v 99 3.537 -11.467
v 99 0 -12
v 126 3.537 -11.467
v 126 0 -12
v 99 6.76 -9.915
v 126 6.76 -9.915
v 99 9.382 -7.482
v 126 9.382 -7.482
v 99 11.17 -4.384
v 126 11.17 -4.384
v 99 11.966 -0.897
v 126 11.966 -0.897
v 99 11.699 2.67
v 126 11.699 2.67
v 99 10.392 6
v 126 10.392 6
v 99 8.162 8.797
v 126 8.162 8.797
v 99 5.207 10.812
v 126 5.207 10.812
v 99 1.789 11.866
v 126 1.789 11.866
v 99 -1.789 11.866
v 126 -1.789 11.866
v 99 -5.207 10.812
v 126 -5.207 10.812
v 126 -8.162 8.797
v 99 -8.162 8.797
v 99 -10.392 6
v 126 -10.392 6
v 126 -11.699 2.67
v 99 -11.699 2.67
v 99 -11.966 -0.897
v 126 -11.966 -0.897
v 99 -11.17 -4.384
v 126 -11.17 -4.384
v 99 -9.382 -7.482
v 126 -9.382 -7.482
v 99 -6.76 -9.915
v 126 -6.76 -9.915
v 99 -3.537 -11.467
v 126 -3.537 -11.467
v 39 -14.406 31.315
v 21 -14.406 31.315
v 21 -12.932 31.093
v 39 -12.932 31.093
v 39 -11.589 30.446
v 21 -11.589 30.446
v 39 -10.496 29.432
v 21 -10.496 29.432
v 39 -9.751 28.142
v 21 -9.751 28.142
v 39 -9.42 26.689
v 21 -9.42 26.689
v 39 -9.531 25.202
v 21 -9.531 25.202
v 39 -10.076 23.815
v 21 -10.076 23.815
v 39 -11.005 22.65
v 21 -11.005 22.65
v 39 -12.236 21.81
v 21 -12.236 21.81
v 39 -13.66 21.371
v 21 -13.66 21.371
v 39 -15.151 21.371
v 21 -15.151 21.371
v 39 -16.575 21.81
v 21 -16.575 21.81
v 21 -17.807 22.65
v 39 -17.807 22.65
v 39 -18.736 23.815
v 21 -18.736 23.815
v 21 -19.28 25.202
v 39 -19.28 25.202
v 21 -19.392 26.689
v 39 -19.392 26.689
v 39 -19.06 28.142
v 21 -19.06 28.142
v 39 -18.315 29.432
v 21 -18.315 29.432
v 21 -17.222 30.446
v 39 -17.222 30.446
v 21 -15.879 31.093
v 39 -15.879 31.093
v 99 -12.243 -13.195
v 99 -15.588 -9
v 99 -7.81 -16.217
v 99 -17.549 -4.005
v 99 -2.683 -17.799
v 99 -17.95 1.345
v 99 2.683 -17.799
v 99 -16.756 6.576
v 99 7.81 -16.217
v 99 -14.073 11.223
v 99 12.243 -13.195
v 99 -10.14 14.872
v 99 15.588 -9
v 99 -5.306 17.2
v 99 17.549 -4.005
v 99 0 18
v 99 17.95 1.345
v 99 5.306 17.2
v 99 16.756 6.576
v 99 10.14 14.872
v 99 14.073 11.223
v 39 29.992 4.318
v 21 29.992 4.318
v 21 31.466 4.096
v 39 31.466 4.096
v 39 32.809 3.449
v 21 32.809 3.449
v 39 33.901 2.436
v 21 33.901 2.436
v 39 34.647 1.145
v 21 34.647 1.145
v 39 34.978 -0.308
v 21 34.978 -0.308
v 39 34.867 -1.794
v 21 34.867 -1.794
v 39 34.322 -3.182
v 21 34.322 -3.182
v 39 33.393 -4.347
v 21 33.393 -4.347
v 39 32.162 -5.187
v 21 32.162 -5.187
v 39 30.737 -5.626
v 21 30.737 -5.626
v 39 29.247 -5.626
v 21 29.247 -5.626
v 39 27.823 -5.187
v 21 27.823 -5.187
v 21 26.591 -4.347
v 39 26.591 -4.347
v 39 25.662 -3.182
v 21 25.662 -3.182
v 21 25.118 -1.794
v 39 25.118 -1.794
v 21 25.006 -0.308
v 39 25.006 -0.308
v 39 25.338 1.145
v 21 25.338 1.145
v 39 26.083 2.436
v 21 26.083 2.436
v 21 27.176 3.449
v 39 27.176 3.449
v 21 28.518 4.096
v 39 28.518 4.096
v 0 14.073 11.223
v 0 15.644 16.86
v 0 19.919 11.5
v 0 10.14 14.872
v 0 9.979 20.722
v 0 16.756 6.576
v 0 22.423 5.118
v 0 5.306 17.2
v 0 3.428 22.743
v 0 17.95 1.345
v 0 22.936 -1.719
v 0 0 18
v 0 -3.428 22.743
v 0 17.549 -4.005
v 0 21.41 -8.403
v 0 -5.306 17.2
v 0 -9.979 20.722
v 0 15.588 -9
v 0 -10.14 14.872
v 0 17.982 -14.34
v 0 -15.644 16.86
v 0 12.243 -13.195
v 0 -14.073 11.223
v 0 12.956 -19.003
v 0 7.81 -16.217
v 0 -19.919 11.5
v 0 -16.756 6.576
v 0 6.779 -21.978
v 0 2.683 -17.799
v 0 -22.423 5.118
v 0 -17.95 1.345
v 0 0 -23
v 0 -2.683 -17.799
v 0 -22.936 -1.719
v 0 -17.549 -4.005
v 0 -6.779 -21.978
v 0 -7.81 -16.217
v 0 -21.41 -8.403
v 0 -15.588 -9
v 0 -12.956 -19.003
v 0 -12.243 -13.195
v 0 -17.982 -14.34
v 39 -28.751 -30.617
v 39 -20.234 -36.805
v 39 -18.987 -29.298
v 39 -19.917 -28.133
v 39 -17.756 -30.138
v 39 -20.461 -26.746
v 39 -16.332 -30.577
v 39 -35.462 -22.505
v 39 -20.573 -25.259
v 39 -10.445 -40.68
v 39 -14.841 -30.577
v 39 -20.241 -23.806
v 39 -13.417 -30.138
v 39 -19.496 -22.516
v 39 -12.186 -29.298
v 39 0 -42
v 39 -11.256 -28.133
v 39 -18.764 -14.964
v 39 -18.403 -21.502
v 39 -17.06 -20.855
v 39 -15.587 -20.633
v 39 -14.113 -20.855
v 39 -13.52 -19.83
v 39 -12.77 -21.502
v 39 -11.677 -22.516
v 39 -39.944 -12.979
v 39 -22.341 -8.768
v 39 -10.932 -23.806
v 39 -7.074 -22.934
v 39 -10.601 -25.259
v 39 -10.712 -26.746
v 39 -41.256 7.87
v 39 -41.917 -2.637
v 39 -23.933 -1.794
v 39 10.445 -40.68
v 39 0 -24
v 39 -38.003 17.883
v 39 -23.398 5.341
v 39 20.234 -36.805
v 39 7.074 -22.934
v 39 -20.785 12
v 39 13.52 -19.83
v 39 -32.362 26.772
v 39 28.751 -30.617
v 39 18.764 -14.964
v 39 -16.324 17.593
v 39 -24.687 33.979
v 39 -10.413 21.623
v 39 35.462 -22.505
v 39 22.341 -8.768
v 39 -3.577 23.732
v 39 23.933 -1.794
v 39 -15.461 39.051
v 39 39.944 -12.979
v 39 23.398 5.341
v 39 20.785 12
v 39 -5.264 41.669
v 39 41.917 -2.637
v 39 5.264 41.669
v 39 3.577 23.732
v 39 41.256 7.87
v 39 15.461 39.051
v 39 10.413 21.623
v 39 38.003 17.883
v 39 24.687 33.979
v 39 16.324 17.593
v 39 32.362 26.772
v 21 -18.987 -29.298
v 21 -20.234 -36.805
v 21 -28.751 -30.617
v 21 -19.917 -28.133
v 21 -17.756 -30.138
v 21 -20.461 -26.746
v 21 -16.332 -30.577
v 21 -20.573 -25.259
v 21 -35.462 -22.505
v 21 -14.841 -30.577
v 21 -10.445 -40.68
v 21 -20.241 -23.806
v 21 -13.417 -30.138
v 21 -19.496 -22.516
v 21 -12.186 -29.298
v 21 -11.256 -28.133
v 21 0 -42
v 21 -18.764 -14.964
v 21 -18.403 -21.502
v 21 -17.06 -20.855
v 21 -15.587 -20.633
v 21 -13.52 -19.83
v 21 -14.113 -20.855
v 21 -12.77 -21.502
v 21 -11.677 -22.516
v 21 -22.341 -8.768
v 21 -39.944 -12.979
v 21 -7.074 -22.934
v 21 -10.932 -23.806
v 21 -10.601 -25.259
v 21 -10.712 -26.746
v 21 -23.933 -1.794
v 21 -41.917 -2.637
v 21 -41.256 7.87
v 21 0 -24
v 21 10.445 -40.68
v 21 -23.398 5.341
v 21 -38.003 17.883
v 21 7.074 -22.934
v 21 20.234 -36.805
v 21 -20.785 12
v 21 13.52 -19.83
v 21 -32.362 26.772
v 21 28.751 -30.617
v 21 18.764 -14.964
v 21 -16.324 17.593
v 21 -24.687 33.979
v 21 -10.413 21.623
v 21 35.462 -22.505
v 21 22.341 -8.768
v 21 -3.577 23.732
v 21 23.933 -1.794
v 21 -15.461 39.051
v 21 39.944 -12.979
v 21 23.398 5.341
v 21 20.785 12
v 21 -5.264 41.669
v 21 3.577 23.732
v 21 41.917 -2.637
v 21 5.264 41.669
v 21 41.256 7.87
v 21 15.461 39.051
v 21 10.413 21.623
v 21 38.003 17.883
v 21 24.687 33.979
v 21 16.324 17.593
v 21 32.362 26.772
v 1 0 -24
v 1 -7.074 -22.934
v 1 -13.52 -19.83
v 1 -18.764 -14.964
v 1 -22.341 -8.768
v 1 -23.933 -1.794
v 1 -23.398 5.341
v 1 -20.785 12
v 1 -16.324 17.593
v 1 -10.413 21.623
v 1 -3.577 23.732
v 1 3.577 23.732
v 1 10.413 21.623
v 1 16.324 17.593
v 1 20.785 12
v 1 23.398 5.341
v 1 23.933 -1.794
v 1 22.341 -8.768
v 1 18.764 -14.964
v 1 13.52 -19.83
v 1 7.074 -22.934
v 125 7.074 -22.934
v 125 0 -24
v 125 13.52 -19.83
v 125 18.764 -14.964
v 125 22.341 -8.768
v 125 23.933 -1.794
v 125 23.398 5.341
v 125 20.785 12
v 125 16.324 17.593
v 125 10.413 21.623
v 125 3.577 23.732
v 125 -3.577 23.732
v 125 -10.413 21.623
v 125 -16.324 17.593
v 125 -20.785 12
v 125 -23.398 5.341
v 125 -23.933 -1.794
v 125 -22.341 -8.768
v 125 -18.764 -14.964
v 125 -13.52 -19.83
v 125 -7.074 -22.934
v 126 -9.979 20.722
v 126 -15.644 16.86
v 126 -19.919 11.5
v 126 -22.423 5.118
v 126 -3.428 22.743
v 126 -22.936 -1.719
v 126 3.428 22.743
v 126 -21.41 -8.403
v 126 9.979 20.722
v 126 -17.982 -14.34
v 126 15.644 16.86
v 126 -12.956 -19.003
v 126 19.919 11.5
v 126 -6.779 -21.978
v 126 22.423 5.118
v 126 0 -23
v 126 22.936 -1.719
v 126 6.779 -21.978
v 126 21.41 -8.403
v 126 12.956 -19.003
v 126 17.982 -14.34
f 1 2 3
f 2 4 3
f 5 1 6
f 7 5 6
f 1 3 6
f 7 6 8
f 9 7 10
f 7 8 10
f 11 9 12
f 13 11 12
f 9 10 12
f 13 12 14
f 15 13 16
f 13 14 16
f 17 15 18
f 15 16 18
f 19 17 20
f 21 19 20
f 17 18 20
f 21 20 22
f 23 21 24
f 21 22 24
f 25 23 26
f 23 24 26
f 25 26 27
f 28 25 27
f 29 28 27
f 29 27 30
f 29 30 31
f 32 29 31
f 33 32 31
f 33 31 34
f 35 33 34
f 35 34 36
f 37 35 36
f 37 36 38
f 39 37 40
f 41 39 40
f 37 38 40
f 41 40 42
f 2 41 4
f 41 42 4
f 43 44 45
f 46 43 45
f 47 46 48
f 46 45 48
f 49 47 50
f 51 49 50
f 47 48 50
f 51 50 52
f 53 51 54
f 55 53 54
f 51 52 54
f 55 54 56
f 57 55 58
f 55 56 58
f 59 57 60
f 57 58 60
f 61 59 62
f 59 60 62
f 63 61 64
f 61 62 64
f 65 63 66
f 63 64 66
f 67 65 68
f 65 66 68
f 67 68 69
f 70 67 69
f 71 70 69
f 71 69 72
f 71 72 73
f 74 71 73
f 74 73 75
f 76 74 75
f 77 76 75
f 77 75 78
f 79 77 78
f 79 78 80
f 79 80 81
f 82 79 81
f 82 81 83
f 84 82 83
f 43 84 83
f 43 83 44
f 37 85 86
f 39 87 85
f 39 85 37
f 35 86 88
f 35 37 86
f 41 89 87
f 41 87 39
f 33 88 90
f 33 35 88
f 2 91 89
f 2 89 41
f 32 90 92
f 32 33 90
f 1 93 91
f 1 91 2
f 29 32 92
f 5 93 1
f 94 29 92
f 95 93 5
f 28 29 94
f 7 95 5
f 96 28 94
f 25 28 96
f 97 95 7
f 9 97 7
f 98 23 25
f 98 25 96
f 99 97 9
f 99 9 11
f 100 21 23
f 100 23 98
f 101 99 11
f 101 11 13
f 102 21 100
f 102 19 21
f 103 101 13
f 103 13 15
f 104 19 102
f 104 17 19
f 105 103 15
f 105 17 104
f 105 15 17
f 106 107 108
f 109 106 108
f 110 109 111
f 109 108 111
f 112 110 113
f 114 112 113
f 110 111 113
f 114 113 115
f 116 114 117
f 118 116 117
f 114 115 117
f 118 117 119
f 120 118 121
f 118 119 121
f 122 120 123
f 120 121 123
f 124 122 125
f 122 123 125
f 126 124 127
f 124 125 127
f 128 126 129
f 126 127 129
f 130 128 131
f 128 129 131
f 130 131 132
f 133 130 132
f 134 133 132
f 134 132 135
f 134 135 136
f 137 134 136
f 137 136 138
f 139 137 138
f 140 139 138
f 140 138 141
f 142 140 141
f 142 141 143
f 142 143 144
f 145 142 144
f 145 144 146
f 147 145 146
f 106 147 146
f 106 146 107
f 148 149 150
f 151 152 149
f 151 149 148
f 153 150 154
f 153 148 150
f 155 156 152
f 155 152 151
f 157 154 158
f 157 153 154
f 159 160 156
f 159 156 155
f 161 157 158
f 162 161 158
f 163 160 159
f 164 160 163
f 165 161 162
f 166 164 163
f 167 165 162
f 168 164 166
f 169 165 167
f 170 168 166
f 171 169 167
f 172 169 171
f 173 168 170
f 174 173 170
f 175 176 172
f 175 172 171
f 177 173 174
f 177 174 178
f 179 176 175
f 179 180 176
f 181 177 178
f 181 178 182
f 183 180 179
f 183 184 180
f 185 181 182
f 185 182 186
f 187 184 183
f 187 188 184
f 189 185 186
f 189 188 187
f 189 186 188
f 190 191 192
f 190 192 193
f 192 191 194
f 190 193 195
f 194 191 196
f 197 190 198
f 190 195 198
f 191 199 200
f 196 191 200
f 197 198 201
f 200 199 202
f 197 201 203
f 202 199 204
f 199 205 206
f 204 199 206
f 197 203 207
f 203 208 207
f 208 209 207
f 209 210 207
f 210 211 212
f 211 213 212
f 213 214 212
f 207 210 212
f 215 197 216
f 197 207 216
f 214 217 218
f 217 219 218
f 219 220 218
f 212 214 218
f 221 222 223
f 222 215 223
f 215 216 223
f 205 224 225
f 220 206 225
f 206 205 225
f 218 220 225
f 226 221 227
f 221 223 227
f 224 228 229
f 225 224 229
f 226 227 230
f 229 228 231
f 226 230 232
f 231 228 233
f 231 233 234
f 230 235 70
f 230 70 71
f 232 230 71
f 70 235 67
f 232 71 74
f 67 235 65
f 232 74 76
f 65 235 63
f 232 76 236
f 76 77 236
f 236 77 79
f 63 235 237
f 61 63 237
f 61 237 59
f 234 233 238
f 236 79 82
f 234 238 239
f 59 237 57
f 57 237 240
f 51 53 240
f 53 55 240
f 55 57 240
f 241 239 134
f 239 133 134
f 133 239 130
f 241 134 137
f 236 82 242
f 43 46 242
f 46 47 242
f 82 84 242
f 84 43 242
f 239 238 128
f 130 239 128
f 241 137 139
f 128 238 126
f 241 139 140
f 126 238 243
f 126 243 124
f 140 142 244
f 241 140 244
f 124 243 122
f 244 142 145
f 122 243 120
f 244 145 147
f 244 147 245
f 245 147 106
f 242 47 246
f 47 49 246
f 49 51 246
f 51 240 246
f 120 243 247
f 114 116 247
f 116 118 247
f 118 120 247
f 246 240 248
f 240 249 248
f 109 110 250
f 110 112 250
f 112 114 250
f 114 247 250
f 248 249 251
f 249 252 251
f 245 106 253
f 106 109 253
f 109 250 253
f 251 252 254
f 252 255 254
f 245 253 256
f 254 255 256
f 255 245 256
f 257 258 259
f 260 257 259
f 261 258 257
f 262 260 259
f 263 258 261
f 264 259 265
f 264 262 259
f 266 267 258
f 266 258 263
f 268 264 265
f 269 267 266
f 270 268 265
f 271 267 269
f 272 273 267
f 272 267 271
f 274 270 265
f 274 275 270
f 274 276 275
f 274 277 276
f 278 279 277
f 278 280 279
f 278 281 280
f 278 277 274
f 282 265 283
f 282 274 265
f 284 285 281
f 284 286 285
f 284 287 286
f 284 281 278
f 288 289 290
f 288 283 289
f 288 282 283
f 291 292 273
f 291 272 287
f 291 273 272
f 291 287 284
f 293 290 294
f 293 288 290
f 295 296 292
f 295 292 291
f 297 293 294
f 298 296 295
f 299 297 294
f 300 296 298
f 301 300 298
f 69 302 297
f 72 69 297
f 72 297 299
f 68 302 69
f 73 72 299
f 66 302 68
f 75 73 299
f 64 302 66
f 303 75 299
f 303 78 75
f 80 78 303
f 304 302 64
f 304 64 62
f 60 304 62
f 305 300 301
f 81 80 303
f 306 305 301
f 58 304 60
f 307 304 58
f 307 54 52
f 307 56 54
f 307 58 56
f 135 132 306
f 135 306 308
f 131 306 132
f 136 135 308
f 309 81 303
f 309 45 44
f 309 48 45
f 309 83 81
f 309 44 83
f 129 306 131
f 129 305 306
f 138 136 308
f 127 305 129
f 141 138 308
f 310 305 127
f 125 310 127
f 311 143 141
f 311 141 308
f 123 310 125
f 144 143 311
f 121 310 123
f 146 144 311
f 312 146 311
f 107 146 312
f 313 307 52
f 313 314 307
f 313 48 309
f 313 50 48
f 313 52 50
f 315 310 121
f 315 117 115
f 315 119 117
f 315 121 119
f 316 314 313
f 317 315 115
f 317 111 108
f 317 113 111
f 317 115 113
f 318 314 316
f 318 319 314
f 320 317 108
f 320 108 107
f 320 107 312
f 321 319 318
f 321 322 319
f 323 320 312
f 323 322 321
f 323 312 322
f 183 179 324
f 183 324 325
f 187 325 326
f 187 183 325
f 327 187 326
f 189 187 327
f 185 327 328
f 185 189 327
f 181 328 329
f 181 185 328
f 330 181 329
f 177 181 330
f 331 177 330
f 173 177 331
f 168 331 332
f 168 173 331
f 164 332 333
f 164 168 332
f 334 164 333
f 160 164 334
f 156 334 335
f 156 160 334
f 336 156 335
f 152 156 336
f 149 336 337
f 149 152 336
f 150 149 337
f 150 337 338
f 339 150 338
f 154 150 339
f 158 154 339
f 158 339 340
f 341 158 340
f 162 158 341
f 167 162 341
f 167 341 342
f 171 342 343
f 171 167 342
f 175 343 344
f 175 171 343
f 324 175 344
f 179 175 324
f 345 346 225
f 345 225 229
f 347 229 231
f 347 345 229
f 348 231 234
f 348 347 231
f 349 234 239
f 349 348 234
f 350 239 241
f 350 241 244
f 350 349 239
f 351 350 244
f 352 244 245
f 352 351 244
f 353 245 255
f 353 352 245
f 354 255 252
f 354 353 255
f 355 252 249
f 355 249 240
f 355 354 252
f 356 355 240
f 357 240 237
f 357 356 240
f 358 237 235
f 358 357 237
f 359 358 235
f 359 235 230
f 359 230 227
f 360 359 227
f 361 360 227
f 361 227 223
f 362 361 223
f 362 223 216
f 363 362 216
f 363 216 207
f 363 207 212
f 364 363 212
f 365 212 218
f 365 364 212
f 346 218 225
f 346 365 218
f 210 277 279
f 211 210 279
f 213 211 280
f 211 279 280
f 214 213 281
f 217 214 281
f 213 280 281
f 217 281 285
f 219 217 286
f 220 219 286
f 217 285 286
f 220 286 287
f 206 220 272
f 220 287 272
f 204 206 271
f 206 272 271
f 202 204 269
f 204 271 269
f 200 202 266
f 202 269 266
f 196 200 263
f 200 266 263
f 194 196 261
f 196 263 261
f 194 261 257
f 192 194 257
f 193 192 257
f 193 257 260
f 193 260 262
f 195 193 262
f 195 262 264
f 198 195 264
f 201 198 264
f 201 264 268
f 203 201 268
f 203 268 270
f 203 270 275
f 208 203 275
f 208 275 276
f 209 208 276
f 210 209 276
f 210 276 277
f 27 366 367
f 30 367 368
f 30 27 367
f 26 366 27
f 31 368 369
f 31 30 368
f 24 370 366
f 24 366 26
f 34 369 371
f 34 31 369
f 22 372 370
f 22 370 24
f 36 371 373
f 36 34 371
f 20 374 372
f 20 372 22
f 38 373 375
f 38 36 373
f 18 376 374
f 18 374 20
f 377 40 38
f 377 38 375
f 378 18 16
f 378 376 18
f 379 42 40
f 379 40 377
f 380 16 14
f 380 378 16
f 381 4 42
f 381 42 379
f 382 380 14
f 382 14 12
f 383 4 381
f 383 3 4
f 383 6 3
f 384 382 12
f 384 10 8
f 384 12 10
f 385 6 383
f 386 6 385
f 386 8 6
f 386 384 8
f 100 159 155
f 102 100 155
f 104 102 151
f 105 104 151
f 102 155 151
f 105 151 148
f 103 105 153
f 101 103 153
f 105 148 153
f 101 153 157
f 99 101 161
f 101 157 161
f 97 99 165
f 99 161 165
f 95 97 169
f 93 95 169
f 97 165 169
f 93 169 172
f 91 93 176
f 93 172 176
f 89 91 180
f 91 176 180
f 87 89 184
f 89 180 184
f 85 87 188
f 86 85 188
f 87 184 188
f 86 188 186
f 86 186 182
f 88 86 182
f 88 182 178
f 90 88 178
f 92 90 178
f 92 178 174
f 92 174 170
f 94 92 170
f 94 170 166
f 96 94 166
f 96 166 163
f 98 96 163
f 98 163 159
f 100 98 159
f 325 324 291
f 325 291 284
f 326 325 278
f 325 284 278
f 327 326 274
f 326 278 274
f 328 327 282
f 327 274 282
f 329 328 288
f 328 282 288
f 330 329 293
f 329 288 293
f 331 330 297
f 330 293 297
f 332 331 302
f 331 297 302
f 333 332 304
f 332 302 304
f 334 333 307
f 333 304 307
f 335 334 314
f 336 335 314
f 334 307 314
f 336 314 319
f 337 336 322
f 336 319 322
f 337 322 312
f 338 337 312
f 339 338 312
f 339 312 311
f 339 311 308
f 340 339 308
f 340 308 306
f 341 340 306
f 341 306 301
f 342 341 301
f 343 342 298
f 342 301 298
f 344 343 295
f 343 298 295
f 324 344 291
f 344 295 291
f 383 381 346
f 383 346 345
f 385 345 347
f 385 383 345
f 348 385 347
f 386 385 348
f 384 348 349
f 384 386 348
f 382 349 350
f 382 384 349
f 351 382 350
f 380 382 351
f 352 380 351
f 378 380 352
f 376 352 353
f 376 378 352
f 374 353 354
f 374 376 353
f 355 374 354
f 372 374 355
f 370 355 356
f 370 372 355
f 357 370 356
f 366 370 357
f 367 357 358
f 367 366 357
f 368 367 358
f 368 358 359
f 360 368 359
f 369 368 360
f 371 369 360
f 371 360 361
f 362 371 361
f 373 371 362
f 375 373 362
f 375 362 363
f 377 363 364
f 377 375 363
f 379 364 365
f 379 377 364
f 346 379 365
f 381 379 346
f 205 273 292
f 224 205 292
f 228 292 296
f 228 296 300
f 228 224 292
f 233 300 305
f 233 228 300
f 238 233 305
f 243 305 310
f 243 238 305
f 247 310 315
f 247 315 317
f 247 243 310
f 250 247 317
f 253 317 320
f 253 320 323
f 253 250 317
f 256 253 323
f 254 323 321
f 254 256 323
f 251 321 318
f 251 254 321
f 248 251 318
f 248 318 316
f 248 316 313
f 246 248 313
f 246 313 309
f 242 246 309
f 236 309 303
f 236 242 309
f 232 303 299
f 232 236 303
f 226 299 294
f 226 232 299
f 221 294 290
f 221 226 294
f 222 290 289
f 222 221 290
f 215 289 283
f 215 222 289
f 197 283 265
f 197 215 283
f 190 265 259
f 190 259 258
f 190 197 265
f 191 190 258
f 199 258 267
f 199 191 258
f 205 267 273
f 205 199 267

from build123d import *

# Parameters (mm, degrees)
ESQUISSE1_W                      = 18
ESQUISSE1_H                      = 42
ESQUISSE2_R                      = 24
EXTRUSION1_DEPTH                 = 21
EXTRUSION2_START                 = 87
ESQUISSE3_R                      = 24
EXTRUSION2_DEPTH                 = 87
DIAM_TRE_DU_PER_AGE_M10_0_10_1_D = 10
DIAM_TRE_DU_PER_AGE_M10_0_10_2_D = 10
DIAM_TRE_DU_PER_AGE_M10_0_10_3_D = 10
PER_AGE1_D                       = 24
PER_AGE1_CBORE_D                 = 36
PER_AGE1_CBORE_DEPTH             = 99
CHANFREIN1_SIZE                  = 1


with BuildPart() as part:
    # Esquisse1 → Révolution1 (revolve)
    with BuildSketch(Plane.XY, mode=Mode.PRIVATE) as r_volution1_sk:
        with Locations((30, 21)):
            Rectangle(ESQUISSE1_W, ESQUISSE1_H)
    revolve(r_volution1_sk.sketch.rotate(Axis((21, 0, 0), (1, 0, 0)), 270), axis=Axis((21, 0, 0), (1, 0, 0)))

    # Esquisse2 → Extrusion1 (add)
    with BuildSketch(Plane.ZY.offset(-21)):
        with Locations(Location((0, 0, 0), (0, 0, 180))):
            Circle(ESQUISSE2_R)
    extrude(amount=EXTRUSION1_DEPTH)

    # Esquisse3 → Extrusion2 (add)
    with BuildSketch(Plane(origin=(39, 0, 0), x_dir=(0, 0, -1), z_dir=(1, 0, 0)).offset(EXTRUSION2_START)):
        Circle(ESQUISSE3_R)
    extrude(amount=-EXTRUSION2_DEPTH)

    # Diamètre du perçage M10.0 (10)1 (through all)
    with Locations(Plane(origin=(39, 0, 0), x_dir=(0, 0, -1), z_dir=(1, 0, 0))):
        with Locations((25.633132295, -15.586613768)):
            Hole(DIAM_TRE_DU_PER_AGE_M10_0_10_1_D / 2)

    # Diamètre du perçage M10.0 (10)2 (through all)
    with Locations(Plane(origin=(39, 0, 0), x_dir=(0, 0, -1), z_dir=(1, 0, 0))):
        with Locations((0.681837335, 29.99225063)):
            Hole(DIAM_TRE_DU_PER_AGE_M10_0_10_2_D / 2)

    # Diamètre du perçage M10.0 (10)3 (through all)
    with Locations(Plane(origin=(39, 0, 0), x_dir=(0, 0, -1), z_dir=(1, 0, 0))):
        with Locations((-26.31496963, -14.405636862)):
            Hole(DIAM_TRE_DU_PER_AGE_M10_0_10_3_D / 2)

    # Perçage1 (through all)
    with Locations(Plane.ZY):
        with Locations((0, 0)):
            CounterBoreHole(PER_AGE1_D / 2, PER_AGE1_CBORE_D / 2, PER_AGE1_CBORE_DEPTH)

    # Chanfrein1
    chanfrein1_edges = [part.edges().sort_by_distance(p)[0] for p in [
        (126, 0, 24),
        (0, 0, 24),
    ]]
    chamfer(chanfrein1_edges, length=CHANFREIN1_SIZE)


solid = part.part
